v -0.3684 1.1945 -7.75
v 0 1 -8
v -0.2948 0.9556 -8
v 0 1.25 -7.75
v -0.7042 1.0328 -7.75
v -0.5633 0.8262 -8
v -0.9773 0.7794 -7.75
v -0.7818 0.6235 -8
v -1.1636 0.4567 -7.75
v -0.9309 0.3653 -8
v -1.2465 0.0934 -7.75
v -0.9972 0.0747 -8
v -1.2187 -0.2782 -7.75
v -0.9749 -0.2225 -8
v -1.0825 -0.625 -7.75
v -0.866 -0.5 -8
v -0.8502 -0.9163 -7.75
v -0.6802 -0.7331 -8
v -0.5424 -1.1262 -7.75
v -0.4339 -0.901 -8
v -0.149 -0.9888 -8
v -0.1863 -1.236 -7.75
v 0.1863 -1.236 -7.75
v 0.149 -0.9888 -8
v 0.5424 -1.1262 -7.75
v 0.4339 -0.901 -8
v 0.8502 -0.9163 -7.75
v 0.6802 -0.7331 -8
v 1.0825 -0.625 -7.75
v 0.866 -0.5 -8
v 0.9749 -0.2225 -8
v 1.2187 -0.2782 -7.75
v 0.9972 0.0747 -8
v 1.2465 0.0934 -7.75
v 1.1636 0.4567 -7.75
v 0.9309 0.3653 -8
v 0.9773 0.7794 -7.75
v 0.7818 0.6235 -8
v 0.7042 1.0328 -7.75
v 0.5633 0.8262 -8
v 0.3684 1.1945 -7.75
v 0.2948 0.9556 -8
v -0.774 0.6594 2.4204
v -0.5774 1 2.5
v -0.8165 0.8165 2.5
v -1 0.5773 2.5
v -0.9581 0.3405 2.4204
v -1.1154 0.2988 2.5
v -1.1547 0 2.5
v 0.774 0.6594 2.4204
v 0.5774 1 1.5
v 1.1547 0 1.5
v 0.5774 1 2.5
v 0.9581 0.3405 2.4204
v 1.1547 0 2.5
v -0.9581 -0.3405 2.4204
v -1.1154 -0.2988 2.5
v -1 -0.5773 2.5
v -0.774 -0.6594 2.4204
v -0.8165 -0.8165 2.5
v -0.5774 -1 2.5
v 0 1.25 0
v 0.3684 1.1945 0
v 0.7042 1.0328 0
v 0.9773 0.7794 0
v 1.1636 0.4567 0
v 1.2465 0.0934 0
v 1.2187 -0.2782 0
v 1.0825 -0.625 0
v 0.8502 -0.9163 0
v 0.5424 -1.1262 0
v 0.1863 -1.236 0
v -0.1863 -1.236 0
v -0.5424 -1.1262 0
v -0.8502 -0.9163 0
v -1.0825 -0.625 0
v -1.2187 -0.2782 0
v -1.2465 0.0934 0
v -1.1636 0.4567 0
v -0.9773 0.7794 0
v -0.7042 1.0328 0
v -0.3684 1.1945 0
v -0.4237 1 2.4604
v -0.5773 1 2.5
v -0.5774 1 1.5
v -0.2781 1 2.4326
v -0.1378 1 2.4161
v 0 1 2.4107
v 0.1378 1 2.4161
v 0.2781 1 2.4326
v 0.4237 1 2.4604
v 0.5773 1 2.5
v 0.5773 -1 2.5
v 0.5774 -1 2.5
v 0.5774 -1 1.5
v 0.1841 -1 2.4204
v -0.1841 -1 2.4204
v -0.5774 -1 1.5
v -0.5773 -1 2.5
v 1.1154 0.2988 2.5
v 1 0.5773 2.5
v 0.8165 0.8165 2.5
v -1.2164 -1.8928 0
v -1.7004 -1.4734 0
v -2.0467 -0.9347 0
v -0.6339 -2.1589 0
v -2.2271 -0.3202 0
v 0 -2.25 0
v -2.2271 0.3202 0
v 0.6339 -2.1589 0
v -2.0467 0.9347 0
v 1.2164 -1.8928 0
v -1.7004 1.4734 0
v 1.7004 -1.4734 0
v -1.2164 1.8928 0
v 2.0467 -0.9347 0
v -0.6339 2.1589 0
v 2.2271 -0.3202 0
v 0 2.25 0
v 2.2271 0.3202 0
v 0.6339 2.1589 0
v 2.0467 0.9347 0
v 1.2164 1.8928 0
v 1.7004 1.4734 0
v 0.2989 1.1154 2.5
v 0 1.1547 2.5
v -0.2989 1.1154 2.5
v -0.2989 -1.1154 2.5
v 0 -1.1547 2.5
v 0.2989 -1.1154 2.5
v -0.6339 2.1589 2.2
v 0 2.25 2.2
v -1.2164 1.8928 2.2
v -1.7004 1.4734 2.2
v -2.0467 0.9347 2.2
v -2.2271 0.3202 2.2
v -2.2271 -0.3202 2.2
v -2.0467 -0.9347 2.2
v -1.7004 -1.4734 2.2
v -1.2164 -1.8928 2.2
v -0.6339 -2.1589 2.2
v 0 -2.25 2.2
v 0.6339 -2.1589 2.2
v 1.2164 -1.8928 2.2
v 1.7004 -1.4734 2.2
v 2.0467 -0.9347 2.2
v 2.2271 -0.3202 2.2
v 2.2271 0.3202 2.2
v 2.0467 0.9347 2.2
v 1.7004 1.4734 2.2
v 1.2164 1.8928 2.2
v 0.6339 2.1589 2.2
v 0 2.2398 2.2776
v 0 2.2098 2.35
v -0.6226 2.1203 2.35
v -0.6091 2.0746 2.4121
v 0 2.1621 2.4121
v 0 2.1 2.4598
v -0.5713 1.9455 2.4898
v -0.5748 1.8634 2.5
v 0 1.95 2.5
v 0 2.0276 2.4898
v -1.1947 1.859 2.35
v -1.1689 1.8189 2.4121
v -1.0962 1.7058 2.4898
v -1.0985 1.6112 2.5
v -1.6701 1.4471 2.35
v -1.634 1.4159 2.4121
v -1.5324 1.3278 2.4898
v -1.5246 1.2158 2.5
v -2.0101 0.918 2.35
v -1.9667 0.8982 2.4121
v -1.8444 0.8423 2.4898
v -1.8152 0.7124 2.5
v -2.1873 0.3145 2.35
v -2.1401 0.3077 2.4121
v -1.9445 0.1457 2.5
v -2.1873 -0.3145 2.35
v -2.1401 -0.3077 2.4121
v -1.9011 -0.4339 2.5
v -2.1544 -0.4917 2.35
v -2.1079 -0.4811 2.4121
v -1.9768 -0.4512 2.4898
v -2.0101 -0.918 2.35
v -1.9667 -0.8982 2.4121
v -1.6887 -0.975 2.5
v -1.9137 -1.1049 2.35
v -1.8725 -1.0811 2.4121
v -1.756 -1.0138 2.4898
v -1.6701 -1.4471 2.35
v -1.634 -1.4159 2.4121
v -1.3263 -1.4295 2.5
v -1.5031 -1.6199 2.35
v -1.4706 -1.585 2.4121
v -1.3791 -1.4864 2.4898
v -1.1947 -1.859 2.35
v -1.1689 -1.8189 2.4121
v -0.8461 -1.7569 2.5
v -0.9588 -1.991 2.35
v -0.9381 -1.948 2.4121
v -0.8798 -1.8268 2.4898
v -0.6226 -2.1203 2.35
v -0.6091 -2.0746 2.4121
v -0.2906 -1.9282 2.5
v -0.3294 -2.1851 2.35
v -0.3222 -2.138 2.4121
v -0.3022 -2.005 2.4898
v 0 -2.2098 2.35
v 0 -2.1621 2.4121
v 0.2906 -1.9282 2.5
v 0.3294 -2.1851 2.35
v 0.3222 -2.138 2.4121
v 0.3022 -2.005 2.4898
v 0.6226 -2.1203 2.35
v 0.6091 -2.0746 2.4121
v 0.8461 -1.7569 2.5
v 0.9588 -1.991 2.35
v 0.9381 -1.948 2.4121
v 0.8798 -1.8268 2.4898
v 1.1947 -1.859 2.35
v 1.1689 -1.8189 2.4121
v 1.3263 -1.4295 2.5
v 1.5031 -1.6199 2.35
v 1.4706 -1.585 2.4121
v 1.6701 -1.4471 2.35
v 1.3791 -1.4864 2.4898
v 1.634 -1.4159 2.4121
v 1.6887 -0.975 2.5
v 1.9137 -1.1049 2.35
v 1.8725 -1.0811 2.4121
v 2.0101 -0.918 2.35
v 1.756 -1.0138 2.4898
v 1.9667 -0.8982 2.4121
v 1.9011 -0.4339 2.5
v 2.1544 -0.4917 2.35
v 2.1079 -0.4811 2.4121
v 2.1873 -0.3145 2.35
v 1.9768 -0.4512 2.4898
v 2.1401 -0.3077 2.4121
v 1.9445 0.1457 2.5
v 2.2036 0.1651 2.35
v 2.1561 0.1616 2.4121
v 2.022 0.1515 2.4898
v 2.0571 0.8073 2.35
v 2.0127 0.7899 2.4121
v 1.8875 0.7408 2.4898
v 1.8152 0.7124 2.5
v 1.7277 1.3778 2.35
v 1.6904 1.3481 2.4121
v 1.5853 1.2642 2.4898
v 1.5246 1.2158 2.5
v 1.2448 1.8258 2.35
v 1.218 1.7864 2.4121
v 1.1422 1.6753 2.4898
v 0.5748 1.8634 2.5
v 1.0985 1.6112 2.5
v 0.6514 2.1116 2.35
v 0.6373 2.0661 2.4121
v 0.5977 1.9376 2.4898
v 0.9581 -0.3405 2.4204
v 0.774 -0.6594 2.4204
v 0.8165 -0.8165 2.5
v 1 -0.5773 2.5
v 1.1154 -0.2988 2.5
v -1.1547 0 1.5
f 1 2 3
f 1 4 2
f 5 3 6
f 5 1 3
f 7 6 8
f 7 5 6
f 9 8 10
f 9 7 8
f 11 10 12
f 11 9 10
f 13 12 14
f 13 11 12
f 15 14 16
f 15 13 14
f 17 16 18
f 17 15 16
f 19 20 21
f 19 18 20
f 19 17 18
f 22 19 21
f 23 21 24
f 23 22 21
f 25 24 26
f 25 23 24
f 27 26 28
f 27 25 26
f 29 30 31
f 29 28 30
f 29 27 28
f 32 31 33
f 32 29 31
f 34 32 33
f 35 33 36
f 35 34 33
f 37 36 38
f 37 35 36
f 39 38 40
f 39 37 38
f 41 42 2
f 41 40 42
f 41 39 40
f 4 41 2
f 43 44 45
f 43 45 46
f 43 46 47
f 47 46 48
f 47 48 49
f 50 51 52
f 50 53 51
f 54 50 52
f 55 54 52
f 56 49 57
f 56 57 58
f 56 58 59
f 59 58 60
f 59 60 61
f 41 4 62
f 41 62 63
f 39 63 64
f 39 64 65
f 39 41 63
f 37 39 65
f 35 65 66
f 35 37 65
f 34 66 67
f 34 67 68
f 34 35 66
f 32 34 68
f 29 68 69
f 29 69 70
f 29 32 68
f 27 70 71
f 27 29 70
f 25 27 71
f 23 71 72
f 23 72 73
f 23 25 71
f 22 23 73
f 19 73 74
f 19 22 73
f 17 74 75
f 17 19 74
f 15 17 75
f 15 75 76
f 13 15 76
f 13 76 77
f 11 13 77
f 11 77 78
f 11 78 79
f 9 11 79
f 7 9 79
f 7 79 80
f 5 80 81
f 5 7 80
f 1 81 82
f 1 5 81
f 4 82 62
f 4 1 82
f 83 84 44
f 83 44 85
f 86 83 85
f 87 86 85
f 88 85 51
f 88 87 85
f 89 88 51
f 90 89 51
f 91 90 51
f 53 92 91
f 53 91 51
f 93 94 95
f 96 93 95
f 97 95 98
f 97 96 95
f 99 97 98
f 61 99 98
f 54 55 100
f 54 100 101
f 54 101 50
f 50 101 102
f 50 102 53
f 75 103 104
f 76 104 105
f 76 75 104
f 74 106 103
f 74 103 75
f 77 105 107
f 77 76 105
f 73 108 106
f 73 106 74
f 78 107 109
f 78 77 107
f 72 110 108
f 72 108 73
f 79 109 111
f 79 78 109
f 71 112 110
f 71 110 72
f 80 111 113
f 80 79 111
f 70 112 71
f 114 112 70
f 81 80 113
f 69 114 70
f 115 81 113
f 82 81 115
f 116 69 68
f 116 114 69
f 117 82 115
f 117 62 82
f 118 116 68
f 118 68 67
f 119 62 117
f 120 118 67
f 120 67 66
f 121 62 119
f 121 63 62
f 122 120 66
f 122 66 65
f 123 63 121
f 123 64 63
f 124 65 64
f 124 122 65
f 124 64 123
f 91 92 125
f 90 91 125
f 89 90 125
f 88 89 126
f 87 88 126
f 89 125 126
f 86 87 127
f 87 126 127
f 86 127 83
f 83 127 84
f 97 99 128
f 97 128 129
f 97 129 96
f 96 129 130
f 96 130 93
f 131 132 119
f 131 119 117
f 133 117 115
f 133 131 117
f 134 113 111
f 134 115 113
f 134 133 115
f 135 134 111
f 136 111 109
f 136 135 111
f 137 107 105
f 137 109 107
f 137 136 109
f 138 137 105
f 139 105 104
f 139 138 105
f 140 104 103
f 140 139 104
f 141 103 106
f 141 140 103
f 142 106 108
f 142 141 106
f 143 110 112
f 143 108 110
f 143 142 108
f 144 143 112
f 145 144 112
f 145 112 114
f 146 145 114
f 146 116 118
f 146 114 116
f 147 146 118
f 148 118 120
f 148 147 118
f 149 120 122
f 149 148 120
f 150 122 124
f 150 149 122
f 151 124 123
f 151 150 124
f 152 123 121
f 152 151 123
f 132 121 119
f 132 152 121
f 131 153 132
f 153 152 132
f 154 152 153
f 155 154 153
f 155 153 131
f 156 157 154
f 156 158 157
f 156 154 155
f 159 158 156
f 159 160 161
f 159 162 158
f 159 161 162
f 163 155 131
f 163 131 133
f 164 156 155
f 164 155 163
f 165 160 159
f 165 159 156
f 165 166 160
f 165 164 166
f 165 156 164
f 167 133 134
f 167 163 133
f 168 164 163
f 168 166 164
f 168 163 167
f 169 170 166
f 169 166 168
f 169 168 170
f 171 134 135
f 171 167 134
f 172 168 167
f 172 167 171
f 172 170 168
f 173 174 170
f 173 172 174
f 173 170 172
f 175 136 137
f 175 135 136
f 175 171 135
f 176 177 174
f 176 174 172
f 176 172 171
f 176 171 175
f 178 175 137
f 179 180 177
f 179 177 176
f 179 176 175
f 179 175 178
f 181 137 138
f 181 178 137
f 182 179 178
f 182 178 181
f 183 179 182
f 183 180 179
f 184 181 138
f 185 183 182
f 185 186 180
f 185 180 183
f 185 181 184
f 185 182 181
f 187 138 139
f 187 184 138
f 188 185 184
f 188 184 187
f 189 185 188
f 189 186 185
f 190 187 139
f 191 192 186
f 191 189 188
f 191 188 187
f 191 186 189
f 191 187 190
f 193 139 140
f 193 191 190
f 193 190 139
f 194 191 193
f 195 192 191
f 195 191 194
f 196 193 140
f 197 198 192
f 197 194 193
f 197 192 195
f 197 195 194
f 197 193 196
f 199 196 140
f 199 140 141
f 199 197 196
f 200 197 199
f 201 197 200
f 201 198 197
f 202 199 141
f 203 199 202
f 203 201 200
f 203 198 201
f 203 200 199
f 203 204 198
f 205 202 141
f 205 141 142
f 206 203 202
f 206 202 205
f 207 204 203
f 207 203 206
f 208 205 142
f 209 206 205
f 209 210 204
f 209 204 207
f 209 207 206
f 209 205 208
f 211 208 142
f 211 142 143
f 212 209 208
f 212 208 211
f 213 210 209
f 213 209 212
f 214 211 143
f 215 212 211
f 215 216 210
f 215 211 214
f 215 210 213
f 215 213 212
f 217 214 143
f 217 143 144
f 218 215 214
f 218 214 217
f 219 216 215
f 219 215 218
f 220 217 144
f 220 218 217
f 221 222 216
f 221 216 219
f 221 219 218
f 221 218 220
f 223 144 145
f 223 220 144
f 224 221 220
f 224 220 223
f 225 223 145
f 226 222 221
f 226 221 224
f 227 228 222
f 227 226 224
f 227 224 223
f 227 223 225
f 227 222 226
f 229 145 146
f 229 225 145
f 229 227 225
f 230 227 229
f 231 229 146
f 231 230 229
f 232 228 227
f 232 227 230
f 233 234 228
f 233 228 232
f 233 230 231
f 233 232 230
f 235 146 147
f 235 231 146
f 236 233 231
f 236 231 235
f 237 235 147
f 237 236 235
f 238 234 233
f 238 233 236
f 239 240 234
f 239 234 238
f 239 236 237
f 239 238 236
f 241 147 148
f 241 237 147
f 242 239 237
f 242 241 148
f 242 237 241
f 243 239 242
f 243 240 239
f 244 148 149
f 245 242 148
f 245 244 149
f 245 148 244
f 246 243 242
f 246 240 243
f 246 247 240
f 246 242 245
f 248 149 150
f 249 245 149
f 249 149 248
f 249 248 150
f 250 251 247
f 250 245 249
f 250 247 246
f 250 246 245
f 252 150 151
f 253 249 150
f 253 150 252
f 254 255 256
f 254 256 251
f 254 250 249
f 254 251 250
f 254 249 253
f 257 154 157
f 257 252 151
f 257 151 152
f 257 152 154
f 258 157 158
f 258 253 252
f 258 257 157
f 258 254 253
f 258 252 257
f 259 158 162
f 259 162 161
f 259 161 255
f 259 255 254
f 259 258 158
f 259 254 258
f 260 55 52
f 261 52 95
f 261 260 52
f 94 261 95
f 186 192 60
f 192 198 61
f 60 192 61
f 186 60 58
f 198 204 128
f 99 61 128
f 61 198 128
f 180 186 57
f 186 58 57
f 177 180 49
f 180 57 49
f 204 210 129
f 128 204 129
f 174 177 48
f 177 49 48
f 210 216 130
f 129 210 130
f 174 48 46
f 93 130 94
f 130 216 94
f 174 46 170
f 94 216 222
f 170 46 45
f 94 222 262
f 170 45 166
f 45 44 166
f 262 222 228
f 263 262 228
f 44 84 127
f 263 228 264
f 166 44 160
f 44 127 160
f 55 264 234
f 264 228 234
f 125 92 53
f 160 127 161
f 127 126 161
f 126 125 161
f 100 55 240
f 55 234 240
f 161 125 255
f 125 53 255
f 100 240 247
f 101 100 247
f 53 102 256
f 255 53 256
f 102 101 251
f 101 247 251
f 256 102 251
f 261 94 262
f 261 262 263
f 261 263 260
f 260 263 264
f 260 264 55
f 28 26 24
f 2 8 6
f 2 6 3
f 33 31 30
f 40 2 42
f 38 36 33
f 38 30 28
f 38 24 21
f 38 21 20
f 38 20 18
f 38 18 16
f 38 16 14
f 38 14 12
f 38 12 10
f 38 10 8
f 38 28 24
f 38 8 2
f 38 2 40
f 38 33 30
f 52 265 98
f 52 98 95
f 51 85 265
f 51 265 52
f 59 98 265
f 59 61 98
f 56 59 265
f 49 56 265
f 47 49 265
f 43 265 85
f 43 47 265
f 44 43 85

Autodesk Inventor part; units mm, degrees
ref_plane "YZ Plane" through (0, 0, 0) normal (1, 0, 0) x (0, 1, 0)
ref_plane "XZ Plane" through (0, 0, 0) normal (0, 1, 0) x (-1, 0, 0)
ref_plane "XY Plane" through (0, 0, 0) normal (0, 0, 1) x (1, 0, 0)
sketch "スケッチ1" plane through (0, 0, 0) normal (1, 0, 0) x (0, 1, 0)
  line L0 (0, 0) -> (1.25, 0) construction
  line L1 (2.25, 0) -> (2.25, 2.2)
  line L2 (1.95, 2.5) -> (1.1547, 2.5)
  line L3 (0, 2.5) -> (0, 1.8333) construction
  line L4 (1.25, 0) -> (1.25, -8)
  line L5 (1.25, -8) -> (0, -8)
  line L6 (0, -8) -> (0, 0)
  line L7 (1.25, 0) -> (2.25, 0)
  line L8 (1.1547, 2.5) -> (0.5774, 1.5) construction
  line L9 (0.5774, 1.5) -> (-0.5774, 1.5) construction
  line L10 (-0.5774, 1.5) -> (-1.1547, 2.5) construction
  line L11 (-1.1547, 2.5) -> (-0.5774, 3.5) construction
  line L12 (-0.5774, 3.5) -> (0.5774, 3.5) construction
  line L13 (0.5774, 3.5) -> (1.1547, 2.5) construction
  line L14 (1.1547, 2.5) -> (0, 1.8333)
  line L15 (1.1547, 2.5) -> (0, 2.5) construction
  line L16 (0, 1.8333) -> (0, 0)
  arc A0 (2.25, 2.2) -> (1.95, 2.5) centre (1.95, 2.2) ccw
  dimension "d0" = 2
  dimension "d1" = 4.5
  dimension "d2" = 2.5
  dimension "d3" = 8
  dimension "d4" = 2.5
  dimension "d6" = 0.3
  dimension "d11" = 30
revolve "回転1" add sketch "スケッチ1" angle 360 about axis through (0, 0, 1.8333) along (0, 0, -1)
sketch "スケッチ2" plane through (0, 0, 2.5) normal (0, 0, 1) x (1, 0, 0)
  line L0 (1.1547, 0) -> (0.5774, -1)
  line L1 (0.5774, -1) -> (-0.5774, -1)
  line L2 (-0.5774, -1) -> (-1.1547, 0)
  line L3 (-1.1547, 0) -> (-0.5774, 1)
  line L4 (-0.5774, 1) -> (0.5774, 1)
  line L5 (0.5774, 1) -> (1.1547, 0)
  point P0 (0, 0)
  point P1 (0, 0)
  dimension "d8" = 2
extrude "押し出し1" cut sketch "スケッチ2" against normal blind 1
chamfer "面取り1" distance 0.25 angle 45 1 edges at (0, -1.25, -8)
properties part number "10_054_CAP_BOLT_M2_5X8_R1" material "鋼、炭素鋼"
